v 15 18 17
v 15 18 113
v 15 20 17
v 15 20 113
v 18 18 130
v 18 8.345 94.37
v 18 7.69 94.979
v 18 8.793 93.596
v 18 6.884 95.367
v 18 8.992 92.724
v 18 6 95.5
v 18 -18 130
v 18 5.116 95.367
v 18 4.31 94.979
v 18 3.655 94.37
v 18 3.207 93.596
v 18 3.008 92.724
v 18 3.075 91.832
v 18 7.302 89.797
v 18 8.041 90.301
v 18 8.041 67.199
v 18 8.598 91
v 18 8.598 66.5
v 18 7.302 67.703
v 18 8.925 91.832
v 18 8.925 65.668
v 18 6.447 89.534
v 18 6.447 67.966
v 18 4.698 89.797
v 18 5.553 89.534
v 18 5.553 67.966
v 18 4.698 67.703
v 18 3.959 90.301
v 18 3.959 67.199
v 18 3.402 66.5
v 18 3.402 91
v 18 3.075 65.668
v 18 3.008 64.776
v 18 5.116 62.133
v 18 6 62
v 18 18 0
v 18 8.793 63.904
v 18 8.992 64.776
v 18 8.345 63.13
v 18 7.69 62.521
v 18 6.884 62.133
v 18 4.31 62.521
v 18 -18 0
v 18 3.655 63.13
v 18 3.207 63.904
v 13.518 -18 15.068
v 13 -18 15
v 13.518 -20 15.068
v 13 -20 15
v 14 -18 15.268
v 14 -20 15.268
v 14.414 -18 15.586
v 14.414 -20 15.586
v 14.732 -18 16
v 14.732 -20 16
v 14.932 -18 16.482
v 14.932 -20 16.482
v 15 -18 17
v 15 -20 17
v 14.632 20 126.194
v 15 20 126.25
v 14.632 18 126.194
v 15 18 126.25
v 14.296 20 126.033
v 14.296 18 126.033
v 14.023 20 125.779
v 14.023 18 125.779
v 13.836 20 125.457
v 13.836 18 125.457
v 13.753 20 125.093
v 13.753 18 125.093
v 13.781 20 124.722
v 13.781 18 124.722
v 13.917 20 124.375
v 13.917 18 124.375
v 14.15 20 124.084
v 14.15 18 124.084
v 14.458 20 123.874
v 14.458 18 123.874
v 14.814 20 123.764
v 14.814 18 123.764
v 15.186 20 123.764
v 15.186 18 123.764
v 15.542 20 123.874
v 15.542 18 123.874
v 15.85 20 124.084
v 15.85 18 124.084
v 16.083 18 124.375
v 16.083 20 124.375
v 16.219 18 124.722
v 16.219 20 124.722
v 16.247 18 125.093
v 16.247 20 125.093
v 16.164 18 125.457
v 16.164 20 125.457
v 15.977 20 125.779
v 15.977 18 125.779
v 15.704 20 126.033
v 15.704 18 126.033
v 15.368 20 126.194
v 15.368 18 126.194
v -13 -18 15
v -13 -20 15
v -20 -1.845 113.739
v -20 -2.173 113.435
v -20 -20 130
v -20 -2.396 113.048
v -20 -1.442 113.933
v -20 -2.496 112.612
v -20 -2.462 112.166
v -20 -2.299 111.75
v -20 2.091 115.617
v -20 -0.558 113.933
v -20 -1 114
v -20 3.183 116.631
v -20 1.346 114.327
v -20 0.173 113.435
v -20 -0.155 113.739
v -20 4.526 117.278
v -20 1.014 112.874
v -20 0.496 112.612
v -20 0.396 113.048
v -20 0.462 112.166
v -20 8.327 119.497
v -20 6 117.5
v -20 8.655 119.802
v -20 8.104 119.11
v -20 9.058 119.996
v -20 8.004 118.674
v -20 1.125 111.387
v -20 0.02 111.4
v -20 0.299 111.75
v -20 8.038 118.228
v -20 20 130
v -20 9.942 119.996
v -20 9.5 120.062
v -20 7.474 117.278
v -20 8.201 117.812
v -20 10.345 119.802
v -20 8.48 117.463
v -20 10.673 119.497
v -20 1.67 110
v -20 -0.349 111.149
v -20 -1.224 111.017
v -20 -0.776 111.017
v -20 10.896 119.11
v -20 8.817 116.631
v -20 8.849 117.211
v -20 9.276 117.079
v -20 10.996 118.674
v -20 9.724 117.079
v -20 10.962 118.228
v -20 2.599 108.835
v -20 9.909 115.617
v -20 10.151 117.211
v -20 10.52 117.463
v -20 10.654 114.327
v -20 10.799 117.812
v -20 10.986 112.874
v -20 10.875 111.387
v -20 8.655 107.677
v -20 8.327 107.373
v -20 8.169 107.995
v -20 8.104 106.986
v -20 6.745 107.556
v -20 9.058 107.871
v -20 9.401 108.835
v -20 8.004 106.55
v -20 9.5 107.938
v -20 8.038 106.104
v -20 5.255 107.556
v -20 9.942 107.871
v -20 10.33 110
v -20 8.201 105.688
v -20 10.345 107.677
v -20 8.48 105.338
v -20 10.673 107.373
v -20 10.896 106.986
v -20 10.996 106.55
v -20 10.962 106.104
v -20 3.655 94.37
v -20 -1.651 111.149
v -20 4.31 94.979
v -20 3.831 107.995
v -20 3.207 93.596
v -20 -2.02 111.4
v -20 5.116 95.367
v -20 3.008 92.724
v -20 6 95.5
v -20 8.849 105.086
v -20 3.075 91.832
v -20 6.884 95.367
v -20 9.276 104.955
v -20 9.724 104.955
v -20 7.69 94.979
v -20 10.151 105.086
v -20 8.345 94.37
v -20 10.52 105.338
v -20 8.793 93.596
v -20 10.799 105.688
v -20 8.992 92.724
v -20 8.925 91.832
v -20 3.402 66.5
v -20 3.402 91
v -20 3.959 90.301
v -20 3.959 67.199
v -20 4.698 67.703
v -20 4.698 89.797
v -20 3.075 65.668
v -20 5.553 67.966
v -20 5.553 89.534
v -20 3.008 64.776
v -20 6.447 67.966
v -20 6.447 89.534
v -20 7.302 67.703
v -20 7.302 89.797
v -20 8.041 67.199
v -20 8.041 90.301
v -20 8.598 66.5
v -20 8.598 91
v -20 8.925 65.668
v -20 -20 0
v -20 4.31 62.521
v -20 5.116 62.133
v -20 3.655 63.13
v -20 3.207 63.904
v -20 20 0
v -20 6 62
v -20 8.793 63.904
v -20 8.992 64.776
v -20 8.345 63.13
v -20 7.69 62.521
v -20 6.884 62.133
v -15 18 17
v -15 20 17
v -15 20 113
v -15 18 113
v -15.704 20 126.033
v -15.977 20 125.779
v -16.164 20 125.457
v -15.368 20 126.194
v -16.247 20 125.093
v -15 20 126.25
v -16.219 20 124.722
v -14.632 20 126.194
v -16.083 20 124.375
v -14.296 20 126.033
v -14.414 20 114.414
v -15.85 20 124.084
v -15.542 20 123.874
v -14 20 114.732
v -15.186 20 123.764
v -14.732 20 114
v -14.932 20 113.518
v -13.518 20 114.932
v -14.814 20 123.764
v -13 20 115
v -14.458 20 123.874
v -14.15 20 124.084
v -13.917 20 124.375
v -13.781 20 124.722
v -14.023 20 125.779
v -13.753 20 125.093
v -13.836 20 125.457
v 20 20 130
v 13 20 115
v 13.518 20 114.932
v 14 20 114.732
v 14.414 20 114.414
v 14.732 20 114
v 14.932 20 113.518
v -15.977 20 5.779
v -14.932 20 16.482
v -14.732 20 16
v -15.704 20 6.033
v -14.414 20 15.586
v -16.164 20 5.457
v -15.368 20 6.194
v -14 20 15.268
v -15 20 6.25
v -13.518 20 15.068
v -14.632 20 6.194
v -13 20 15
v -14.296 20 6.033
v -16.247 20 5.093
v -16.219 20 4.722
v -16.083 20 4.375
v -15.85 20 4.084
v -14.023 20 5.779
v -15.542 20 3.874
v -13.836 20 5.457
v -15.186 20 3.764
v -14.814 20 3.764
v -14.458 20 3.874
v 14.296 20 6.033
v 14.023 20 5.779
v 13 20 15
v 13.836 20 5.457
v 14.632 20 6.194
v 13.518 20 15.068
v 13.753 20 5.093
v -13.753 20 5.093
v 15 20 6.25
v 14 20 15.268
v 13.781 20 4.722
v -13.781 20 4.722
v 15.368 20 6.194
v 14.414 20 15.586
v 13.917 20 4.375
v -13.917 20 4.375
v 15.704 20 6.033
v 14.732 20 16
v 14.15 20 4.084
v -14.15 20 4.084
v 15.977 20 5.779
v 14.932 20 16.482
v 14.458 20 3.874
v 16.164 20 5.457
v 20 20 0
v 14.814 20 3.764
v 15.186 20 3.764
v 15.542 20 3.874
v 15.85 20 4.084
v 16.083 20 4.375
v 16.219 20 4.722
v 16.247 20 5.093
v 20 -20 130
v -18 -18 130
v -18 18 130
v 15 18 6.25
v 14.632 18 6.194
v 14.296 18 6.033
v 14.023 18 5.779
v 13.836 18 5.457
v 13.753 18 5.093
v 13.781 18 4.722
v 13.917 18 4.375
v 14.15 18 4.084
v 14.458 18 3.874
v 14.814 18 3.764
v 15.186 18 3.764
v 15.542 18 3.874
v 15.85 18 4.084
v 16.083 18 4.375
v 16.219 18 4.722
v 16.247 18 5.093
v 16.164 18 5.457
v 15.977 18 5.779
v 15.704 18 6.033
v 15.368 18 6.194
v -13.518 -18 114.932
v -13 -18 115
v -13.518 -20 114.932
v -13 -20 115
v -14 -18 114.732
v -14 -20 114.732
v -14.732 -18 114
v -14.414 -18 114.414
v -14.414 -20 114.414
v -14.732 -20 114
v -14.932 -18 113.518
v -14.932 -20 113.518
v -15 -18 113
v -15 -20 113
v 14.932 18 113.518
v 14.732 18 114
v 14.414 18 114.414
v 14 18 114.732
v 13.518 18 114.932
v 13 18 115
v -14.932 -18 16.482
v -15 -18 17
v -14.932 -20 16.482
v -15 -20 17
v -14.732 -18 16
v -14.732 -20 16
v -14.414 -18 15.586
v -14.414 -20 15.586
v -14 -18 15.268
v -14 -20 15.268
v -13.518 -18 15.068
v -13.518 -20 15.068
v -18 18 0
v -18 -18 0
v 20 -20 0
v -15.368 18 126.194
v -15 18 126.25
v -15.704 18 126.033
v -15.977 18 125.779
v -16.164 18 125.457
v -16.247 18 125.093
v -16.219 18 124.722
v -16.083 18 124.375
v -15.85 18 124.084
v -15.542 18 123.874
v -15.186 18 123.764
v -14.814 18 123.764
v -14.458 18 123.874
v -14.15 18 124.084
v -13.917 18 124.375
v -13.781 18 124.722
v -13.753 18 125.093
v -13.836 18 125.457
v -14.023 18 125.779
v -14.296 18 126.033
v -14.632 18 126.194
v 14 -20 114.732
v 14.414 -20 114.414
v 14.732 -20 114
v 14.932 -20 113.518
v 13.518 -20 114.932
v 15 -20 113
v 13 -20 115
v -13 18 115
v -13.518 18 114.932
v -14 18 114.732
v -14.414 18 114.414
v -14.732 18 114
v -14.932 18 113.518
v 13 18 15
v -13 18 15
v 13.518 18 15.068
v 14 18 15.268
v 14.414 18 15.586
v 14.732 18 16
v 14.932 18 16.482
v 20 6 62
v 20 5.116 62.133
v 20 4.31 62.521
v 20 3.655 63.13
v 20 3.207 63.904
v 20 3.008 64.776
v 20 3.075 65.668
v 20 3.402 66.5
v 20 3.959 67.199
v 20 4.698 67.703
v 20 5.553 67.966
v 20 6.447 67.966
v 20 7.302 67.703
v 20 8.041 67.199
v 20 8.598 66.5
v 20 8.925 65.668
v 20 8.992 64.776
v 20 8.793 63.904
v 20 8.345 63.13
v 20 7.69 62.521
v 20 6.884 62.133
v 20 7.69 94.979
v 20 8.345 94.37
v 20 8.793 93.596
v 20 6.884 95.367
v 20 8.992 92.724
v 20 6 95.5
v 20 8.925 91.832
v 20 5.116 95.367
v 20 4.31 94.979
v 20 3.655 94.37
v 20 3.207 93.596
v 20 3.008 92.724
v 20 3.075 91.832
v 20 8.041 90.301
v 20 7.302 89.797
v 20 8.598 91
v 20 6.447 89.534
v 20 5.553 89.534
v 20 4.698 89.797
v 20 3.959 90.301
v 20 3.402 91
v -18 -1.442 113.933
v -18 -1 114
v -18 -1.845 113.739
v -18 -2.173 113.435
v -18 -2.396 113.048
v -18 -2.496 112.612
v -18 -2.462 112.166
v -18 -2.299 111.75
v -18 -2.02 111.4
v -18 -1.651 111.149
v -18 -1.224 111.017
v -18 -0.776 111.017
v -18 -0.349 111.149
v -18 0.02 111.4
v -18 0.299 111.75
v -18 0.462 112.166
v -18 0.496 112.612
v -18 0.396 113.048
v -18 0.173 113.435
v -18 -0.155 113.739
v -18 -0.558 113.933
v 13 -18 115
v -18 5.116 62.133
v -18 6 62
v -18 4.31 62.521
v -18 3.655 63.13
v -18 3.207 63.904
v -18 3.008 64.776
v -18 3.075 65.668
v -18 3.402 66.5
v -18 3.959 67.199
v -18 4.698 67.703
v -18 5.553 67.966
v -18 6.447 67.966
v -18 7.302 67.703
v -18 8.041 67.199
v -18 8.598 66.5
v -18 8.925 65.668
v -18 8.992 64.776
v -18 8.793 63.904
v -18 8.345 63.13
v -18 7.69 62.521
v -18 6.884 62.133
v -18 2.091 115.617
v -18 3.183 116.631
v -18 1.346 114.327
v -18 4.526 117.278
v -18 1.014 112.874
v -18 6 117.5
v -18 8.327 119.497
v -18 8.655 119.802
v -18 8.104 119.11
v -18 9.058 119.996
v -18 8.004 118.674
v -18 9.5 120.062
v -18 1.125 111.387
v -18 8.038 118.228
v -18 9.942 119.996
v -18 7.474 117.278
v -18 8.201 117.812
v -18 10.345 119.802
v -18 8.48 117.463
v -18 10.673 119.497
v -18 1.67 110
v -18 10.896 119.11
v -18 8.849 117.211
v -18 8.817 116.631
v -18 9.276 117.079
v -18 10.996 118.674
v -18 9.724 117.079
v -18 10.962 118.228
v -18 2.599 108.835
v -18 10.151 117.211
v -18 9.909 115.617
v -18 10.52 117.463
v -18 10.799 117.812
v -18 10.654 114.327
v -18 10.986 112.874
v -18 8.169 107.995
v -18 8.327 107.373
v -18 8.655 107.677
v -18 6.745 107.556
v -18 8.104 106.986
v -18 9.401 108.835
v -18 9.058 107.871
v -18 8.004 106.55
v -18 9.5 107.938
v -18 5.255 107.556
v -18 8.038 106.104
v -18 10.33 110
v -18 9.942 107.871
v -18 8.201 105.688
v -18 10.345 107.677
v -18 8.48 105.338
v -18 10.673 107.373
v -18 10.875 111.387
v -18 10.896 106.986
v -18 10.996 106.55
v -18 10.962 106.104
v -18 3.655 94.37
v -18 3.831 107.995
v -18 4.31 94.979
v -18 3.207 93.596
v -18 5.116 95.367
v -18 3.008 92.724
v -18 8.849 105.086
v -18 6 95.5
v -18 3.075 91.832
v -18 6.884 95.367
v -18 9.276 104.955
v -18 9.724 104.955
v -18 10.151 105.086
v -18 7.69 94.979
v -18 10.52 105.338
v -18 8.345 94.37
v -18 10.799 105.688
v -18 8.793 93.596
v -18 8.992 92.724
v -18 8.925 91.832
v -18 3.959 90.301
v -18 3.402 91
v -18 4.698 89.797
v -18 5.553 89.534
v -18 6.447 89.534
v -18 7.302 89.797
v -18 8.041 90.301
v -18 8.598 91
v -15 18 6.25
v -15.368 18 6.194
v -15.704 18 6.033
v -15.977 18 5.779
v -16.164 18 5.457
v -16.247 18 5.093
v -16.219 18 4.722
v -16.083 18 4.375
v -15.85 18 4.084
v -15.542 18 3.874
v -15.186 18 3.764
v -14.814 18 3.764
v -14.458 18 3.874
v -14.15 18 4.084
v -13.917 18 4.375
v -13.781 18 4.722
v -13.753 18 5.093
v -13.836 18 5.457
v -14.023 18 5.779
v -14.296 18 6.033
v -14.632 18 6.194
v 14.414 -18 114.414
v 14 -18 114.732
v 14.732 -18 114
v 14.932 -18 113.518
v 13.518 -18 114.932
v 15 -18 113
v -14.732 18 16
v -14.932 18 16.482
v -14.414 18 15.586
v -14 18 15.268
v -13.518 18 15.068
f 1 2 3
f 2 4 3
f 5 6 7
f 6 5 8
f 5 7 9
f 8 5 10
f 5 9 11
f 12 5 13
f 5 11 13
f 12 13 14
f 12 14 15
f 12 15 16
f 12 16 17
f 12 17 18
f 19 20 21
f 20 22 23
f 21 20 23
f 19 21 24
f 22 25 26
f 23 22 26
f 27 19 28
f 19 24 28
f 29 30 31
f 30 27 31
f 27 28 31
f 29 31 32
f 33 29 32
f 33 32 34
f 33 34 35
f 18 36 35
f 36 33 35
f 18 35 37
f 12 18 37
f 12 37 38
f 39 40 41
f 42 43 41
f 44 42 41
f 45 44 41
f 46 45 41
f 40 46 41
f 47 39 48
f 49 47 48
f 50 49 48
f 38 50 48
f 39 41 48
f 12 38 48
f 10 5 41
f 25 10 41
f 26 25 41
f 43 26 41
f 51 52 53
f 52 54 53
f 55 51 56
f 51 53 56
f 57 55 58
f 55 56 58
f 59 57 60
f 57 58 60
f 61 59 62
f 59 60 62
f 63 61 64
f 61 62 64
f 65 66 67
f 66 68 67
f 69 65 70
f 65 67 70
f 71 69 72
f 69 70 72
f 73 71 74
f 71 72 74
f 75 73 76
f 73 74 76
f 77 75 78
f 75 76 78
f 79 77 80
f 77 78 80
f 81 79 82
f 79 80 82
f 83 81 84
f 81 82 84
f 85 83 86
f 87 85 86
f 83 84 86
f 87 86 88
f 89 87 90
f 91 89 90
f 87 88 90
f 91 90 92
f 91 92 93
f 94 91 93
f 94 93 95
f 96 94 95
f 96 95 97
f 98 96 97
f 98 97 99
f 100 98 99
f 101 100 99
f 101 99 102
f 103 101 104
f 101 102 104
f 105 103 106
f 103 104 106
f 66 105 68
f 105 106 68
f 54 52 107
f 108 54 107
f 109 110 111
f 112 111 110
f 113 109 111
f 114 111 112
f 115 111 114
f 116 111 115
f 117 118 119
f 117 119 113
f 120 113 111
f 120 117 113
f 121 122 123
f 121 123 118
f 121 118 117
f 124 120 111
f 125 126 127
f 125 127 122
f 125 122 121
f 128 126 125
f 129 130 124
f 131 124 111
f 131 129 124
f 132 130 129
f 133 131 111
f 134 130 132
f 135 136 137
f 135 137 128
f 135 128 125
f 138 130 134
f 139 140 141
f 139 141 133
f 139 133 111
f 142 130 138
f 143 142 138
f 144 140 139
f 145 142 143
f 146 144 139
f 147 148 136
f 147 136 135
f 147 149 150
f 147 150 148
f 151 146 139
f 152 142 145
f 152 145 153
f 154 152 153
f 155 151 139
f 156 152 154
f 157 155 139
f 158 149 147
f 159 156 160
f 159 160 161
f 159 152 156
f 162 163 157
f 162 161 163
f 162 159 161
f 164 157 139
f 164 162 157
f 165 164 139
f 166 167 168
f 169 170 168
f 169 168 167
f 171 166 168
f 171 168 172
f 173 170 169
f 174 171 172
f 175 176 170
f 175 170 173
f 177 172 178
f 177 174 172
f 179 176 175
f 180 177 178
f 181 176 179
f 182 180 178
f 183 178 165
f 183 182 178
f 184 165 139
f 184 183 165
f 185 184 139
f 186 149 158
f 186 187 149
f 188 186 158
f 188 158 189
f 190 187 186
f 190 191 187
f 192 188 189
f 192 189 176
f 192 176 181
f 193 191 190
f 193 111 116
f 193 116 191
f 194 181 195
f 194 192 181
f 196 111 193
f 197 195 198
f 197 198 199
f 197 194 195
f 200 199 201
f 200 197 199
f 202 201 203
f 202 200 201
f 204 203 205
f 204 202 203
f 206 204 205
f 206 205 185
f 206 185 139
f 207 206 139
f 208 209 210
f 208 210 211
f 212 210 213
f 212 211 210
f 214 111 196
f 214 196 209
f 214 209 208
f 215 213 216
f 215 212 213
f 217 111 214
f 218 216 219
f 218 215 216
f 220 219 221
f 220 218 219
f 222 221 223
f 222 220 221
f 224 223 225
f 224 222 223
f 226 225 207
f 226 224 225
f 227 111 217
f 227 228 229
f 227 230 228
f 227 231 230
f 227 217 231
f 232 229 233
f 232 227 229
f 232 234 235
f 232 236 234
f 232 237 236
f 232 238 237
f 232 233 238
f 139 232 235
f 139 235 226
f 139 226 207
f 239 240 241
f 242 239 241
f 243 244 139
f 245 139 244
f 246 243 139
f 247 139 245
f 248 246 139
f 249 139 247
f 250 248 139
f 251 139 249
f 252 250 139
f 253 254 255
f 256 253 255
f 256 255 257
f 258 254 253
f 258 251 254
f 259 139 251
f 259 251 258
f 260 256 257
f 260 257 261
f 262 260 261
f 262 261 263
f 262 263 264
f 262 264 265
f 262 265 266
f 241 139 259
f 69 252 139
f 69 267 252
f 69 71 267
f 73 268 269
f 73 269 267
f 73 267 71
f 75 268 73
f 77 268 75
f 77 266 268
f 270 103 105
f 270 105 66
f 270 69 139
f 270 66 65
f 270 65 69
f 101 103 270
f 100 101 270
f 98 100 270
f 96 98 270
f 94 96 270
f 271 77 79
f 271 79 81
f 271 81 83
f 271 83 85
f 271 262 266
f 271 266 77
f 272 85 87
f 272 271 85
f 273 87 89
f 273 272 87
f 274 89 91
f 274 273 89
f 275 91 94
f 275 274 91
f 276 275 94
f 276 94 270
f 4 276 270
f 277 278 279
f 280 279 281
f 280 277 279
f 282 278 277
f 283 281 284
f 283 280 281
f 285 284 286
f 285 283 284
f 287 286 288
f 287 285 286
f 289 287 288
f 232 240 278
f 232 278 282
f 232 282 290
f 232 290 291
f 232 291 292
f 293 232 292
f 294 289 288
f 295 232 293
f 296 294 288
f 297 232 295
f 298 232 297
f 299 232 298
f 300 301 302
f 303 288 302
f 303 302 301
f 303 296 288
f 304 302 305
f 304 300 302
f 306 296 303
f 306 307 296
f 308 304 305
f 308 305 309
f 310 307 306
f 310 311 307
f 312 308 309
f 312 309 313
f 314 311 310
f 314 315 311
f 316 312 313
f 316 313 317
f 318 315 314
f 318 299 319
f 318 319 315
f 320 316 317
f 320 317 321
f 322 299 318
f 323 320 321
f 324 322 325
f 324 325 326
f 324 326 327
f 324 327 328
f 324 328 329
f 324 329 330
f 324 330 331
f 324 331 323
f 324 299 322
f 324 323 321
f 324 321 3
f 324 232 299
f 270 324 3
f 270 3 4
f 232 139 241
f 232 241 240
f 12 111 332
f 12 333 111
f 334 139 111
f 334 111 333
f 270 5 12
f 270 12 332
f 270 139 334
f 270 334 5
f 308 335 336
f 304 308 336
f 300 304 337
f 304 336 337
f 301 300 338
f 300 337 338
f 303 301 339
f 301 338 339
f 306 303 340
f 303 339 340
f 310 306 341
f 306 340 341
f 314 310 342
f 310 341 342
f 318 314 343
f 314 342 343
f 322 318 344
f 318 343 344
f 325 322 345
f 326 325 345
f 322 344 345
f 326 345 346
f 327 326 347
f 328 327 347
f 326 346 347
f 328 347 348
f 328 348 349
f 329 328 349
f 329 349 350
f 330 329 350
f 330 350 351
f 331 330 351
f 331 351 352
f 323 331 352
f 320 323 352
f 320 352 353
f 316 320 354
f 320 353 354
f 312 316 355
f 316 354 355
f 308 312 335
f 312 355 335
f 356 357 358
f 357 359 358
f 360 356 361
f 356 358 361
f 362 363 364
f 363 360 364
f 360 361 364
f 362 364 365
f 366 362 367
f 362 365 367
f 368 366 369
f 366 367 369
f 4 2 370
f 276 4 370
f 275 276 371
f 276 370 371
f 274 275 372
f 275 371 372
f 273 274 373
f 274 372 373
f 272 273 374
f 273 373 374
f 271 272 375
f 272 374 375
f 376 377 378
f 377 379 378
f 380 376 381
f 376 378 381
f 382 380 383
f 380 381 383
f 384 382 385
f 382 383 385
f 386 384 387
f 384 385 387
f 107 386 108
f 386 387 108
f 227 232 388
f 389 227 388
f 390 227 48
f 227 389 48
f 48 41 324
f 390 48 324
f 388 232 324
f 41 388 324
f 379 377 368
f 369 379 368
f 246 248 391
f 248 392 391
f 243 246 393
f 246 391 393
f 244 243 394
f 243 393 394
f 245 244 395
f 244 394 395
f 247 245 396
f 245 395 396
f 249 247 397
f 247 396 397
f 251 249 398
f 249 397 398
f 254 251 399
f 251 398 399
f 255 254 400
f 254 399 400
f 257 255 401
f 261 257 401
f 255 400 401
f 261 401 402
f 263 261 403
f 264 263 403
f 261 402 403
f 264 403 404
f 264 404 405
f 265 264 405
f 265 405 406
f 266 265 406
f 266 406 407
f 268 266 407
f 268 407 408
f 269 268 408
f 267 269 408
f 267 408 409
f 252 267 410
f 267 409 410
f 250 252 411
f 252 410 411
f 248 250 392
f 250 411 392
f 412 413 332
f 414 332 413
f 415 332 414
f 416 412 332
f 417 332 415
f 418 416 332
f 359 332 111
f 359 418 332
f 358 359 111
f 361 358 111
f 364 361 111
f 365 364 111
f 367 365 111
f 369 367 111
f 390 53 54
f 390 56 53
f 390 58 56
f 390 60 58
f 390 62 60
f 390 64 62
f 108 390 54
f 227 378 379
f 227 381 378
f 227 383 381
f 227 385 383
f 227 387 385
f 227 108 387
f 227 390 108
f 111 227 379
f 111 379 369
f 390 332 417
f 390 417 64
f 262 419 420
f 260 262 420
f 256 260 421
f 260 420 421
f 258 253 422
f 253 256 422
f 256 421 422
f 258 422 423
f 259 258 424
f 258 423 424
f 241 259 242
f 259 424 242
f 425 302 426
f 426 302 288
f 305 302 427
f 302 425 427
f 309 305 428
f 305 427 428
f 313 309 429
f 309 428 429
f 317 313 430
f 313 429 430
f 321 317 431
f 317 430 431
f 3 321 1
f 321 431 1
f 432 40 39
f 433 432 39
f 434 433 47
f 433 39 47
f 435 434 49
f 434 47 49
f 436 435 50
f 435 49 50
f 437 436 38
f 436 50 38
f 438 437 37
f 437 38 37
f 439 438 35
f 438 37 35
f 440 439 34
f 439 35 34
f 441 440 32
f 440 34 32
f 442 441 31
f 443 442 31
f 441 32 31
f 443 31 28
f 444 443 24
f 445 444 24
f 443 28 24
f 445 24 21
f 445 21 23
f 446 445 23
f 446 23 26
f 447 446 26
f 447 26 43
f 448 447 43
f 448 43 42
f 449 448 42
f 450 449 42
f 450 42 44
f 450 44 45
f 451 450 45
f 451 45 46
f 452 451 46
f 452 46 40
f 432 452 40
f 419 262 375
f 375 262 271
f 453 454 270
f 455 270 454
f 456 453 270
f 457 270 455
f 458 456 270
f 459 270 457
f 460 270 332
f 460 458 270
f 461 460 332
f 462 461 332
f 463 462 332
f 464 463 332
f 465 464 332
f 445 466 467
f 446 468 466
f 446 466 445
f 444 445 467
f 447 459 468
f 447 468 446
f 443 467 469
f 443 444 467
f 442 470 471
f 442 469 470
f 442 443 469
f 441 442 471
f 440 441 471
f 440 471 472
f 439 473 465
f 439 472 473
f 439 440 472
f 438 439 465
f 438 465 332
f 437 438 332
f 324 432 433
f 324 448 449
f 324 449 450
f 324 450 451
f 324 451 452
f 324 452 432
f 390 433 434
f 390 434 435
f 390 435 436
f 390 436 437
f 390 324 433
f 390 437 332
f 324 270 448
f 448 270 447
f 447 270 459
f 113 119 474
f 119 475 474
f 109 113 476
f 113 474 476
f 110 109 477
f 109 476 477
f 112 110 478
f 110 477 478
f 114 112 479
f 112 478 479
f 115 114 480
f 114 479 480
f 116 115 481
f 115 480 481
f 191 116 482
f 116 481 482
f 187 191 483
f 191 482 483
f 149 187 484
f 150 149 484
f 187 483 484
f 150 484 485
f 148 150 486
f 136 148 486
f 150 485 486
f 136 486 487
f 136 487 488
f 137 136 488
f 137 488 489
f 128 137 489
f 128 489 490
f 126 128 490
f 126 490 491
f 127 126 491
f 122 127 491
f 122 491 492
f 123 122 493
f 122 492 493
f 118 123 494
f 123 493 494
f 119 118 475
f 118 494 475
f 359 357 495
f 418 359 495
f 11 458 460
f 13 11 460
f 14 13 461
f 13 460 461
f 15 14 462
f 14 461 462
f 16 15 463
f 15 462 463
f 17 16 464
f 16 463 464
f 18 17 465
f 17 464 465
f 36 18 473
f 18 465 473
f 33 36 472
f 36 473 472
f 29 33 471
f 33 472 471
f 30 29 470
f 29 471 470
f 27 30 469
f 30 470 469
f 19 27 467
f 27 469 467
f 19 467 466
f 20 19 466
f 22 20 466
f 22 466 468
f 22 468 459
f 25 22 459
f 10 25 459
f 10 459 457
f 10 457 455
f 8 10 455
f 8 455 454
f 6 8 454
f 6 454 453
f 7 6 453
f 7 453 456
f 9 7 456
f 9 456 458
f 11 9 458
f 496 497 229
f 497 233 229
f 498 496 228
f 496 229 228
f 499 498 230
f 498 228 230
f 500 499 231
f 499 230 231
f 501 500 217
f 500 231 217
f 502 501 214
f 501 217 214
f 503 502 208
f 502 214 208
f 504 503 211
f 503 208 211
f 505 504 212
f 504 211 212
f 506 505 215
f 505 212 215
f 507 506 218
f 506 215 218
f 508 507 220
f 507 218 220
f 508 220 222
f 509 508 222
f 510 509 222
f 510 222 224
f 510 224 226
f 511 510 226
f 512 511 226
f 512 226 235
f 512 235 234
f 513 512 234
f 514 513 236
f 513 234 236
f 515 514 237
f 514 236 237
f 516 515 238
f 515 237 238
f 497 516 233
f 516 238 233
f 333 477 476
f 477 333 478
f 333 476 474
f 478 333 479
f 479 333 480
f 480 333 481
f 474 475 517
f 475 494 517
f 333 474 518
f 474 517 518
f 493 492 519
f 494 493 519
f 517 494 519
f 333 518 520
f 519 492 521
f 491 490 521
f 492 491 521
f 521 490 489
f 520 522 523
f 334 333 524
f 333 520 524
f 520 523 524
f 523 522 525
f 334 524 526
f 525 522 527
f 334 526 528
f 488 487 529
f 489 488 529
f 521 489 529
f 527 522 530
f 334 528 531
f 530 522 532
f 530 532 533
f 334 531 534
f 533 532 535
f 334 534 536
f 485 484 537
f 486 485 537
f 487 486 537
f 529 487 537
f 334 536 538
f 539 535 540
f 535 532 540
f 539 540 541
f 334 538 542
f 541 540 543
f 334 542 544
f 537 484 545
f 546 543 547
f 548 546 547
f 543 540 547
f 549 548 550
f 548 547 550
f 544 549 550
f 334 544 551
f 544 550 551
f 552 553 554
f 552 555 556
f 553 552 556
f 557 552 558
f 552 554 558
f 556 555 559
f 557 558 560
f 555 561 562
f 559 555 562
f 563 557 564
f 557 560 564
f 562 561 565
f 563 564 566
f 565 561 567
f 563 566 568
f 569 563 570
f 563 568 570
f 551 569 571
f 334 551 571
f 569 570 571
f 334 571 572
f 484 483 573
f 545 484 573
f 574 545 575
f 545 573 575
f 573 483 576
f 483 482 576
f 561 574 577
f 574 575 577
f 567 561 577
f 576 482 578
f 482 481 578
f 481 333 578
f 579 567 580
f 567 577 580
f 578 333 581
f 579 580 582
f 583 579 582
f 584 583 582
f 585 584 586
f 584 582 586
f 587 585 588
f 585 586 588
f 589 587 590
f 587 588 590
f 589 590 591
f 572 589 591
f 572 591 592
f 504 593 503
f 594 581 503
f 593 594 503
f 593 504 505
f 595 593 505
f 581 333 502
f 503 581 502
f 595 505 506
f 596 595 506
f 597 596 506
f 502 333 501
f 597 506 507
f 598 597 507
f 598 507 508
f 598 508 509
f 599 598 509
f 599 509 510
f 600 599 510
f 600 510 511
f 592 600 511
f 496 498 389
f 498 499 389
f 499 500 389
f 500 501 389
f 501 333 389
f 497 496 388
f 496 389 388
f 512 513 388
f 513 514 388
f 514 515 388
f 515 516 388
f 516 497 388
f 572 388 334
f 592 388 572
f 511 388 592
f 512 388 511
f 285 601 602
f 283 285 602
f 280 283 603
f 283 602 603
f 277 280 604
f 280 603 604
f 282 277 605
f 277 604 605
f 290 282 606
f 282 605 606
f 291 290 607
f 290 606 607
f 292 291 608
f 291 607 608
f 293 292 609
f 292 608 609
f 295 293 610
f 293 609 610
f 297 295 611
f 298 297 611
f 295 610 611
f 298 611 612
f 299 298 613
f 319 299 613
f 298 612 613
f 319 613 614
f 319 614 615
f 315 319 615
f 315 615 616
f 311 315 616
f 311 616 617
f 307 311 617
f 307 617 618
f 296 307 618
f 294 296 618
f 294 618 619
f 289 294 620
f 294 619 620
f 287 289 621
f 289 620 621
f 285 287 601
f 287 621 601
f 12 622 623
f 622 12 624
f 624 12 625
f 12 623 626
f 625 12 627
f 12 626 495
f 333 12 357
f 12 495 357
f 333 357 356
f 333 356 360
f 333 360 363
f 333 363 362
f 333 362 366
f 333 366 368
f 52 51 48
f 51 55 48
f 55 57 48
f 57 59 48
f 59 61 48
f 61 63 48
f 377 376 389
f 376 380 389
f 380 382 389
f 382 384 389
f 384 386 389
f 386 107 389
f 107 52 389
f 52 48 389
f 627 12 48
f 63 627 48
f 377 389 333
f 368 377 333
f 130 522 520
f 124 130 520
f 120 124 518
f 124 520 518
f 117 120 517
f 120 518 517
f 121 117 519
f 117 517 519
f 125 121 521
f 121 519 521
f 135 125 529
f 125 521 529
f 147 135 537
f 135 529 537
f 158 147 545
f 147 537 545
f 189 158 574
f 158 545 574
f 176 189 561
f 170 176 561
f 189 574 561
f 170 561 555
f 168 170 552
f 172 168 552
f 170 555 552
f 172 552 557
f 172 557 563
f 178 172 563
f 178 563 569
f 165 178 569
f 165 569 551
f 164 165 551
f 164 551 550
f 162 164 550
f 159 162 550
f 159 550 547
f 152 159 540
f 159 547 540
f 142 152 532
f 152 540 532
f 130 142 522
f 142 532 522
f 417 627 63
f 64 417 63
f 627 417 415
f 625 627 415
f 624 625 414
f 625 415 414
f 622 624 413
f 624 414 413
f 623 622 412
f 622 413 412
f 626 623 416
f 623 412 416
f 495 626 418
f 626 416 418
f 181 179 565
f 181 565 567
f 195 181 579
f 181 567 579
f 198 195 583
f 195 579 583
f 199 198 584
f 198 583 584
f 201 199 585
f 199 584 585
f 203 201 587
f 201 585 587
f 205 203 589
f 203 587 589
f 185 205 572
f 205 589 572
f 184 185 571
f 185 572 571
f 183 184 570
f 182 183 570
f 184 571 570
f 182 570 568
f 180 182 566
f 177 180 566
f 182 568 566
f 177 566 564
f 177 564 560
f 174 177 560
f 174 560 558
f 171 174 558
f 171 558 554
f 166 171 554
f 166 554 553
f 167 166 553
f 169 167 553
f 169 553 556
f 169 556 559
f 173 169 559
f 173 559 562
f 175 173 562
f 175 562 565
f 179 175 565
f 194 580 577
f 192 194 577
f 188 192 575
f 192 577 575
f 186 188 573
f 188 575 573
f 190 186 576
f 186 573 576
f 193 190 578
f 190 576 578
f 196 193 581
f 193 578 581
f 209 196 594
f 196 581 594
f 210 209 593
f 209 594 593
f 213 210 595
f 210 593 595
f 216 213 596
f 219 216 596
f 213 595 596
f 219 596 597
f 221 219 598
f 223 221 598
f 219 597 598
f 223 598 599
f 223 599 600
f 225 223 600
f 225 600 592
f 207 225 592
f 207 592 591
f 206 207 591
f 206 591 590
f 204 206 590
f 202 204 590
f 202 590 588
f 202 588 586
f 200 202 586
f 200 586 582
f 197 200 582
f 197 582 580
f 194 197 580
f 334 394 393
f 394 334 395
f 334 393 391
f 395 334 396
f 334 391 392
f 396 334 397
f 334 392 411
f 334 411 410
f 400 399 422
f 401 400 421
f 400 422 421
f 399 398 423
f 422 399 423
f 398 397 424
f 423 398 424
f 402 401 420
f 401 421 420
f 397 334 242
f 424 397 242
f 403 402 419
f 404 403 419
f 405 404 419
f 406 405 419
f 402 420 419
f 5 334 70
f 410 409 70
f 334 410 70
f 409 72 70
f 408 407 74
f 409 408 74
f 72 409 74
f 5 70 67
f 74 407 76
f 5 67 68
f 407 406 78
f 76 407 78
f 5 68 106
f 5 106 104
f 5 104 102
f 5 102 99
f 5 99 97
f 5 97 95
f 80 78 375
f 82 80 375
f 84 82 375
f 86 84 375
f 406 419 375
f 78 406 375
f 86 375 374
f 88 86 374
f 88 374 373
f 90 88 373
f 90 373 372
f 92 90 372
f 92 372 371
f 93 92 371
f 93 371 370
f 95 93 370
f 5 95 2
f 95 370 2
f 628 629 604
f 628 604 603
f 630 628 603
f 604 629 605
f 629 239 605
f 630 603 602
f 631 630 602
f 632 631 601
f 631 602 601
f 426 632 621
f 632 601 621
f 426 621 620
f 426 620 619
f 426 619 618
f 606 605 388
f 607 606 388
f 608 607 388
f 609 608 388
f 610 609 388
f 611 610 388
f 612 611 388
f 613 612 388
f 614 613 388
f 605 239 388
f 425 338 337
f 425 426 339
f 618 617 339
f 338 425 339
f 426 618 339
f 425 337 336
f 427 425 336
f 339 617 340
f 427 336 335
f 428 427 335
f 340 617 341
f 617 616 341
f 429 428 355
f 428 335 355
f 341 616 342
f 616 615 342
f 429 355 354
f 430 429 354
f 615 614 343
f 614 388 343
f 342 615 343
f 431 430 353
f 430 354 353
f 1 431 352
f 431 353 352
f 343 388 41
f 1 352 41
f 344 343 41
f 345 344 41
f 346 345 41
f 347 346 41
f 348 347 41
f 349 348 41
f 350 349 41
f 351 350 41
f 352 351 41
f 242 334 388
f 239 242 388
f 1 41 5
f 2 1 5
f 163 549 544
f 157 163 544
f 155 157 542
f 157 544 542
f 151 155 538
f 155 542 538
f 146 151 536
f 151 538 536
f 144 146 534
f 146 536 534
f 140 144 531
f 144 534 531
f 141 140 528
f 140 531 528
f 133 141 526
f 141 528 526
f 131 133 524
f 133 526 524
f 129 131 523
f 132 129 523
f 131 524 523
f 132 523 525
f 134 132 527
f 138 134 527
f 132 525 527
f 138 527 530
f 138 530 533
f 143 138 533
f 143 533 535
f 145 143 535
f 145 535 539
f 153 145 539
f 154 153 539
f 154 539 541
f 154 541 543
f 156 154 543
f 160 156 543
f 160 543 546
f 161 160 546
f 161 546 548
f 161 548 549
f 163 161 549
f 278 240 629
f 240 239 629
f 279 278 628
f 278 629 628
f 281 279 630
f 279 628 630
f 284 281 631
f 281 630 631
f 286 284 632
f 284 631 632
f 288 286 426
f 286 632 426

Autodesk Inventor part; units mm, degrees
ref_plane "YZ Plane" through (0, 0, 0) normal (1, 0, 0) x (0, 1, 0)
ref_plane "XZ Plane" through (0, 0, 0) normal (0, 1, 0) x (-1, 0, 0)
ref_plane "XY Plane" through (0, 0, 0) normal (0, 0, 1) x (1, 0, 0)
sketch "スケッチ1" plane through (0, 0, 0) normal (0, 0, 1) x (1, 0, 0)
  line L0 (-20, 20) -> (20, 20)
  line L1 (20, 20) -> (20, -20)
  line L2 (20, -20) -> (-20, -20)
  line L3 (-20, -20) -> (-20, 20)
  line L4 (-20, 20) -> (20, -20) construction
  line L5 (20, 20) -> (-20, -20) construction
  line L6 (-18, 18) -> (18, 18)
  line L7 (18, 18) -> (18, -18)
  line L8 (18, -18) -> (-18, -18)
  line L9 (-18, -18) -> (-18, 18)
  line L10 (-18, 18) -> (18, -18) construction
  line L11 (18, 18) -> (-18, -18) construction
  point P0 (0, 0)
  point P1 (0, 0)
  dimension "d0" = 40
  dimension "d1" = 40
  dimension "d2" = 2
  dimension "d3" = 2
extrude "押し出し1" add sketch "スケッチ1" along normal blind 130
sketch "スケッチ3" plane through (-20, 20, 0) normal (0, 1, 0) x (1, 0, 0)
  line L0 (5, -115) -> (35, -115)
  line L1 (35, -115) -> (35, -15)
  line L2 (35, -15) -> (5, -15)
  line L3 (5, -15) -> (5, -115)
  line L4 (40, -130) -> (0, -130) projected
  line L5 (0, 0) -> (40, 0) projected
  line L6 (40, 0) -> (40, -130) projected
  line L7 (0, 0) -> (0, -130) projected
  point P0 (20, 0)
  dimension "d6" = 15
  dimension "d7" = 15
  dimension "d8" = 5
  dimension "d9" = 5
extrude "押し出し2" cut sketch "スケッチ3" against normal blind 100 contours L3 L2 L1 L0
fillet "フィレット1" radius 2 8 edges at (-15, 19, 115) (-15, 19, 15) (15, 19, 15) (15, 19, 115) (15, -19, 115) (-15, -19, 115) (-15, -19, 15) (15, -19, 15)
sketch "スケッチ4" plane through (-20, 20, 0) normal (0, 1, 0) x (1, 0, 0)
  line L0 (0, 0) -> (0, -130) projected
  line L1 (0, 0) -> (40, 0) projected
  line L2 (40, 0) -> (40, -130) projected
  line L3 (40, -130) -> (0, -130) projected
  point P0 (20, 0)
  point P1 (5, -5)
  point P2 (5, -125)
  point P3 (35, -125)
  point P4 (35, -5)
  dimension "d13" = 5
  dimension "d14" = 5
  dimension "d15" = 5
  dimension "d16" = 5
  dimension "d17" = 5
  dimension "d18" = 5
  dimension "d19" = 5
  dimension "d20" = 5
hole "穴1" at (-15, 20, 5) at (-15, 20, 125) at (15, 20, 125) at (15, 20, 5) direction (0, -1, 0) diameter 2.5 end up to surface
thread "ねじ1" size "M2.5x0.45" class "6H" standard "ANSI Metric M Profile" full length
thread "ねじ2" size "M2.5x0.45" class "6H" standard "ANSI Metric M Profile" full length
thread "ねじ3" size "M2.5x0.45" class "6H" standard "ANSI Metric M Profile" full length
thread "ねじ4" size "M2.5x0.45" class "6H" standard "ANSI Metric M Profile" full length
sketch "スケッチ5" plane through (20, -20, 0) normal (1, 0, 0) x (0, 0, -1)
  line L0 (0, 40) -> (0, 0) projected
  line L1 (0, 40) -> (-130, 40) projected
  line L2 (-130, 40) -> (-130, 0) projected
  point P0 (0, 20)
  point P1 (-65, 26)
  dimension "d37" = 14
  dimension "d67" = 65
hole "穴2" at (20, 6, 65) direction (-1, 0, 0) diameter 6 end through all
sketch "スケッチ6" plane through (-20, -20, 0) normal (-1, 0, 0) x (0, 0, 1)
  line L0 (0, 0) -> (0, 40) projected
  line L1 (0, 40) -> (130, 40) projected
  line L2 (130, 40) -> (130, 0) projected
  point P0 (0, 20)
  point P1 (112.5, 26)
  dimension "d46" = 14
  dimension "d54" = 17.5
hole "穴3" at (-20, 6, 112.5) direction (1, 0, 0) diameter 10 depth 8
sketch "スケッチ7" plane through (-20, -20, 0) normal (-1, 0, 0) x (0, 0, 1)
  line L0 (0, 40) -> (130, 40) projected
  line L1 (130, 40) -> (130, 0) projected
  point P0 (0, 20)
  point P1 (112.5, 19)
  dimension "d55" = 21
  dimension "d56" = 17.5
hole "穴4" at (-20, -1, 112.5) direction (1, 0, 0) diameter 3 depth 8
pattern_circular "円形状パターン1" count 3 over 360 about axis through (-16, 6, 112.5) along (-1, 0, 0) of "穴4"
sketch "スケッチ8" plane through (-20, -20, 0) normal (-1, 0, 0) x (0, 0, 1)
  line L0 (130, 40) -> (130, 0) projected
  line L1 (0, 0) -> (130, 0) projected
  line L2 (0, 40) -> (130, 40) projected
  point P0 (0, 20)
  point P1 (92.5, 26)
  dimension "d68" = 37.5
  dimension "d77" = 14
hole "穴5" at (-20, 6, 92.5) direction (1, 0, 0) diameter 6 end through all
properties part number "Gear box" material "アルミニウム"
